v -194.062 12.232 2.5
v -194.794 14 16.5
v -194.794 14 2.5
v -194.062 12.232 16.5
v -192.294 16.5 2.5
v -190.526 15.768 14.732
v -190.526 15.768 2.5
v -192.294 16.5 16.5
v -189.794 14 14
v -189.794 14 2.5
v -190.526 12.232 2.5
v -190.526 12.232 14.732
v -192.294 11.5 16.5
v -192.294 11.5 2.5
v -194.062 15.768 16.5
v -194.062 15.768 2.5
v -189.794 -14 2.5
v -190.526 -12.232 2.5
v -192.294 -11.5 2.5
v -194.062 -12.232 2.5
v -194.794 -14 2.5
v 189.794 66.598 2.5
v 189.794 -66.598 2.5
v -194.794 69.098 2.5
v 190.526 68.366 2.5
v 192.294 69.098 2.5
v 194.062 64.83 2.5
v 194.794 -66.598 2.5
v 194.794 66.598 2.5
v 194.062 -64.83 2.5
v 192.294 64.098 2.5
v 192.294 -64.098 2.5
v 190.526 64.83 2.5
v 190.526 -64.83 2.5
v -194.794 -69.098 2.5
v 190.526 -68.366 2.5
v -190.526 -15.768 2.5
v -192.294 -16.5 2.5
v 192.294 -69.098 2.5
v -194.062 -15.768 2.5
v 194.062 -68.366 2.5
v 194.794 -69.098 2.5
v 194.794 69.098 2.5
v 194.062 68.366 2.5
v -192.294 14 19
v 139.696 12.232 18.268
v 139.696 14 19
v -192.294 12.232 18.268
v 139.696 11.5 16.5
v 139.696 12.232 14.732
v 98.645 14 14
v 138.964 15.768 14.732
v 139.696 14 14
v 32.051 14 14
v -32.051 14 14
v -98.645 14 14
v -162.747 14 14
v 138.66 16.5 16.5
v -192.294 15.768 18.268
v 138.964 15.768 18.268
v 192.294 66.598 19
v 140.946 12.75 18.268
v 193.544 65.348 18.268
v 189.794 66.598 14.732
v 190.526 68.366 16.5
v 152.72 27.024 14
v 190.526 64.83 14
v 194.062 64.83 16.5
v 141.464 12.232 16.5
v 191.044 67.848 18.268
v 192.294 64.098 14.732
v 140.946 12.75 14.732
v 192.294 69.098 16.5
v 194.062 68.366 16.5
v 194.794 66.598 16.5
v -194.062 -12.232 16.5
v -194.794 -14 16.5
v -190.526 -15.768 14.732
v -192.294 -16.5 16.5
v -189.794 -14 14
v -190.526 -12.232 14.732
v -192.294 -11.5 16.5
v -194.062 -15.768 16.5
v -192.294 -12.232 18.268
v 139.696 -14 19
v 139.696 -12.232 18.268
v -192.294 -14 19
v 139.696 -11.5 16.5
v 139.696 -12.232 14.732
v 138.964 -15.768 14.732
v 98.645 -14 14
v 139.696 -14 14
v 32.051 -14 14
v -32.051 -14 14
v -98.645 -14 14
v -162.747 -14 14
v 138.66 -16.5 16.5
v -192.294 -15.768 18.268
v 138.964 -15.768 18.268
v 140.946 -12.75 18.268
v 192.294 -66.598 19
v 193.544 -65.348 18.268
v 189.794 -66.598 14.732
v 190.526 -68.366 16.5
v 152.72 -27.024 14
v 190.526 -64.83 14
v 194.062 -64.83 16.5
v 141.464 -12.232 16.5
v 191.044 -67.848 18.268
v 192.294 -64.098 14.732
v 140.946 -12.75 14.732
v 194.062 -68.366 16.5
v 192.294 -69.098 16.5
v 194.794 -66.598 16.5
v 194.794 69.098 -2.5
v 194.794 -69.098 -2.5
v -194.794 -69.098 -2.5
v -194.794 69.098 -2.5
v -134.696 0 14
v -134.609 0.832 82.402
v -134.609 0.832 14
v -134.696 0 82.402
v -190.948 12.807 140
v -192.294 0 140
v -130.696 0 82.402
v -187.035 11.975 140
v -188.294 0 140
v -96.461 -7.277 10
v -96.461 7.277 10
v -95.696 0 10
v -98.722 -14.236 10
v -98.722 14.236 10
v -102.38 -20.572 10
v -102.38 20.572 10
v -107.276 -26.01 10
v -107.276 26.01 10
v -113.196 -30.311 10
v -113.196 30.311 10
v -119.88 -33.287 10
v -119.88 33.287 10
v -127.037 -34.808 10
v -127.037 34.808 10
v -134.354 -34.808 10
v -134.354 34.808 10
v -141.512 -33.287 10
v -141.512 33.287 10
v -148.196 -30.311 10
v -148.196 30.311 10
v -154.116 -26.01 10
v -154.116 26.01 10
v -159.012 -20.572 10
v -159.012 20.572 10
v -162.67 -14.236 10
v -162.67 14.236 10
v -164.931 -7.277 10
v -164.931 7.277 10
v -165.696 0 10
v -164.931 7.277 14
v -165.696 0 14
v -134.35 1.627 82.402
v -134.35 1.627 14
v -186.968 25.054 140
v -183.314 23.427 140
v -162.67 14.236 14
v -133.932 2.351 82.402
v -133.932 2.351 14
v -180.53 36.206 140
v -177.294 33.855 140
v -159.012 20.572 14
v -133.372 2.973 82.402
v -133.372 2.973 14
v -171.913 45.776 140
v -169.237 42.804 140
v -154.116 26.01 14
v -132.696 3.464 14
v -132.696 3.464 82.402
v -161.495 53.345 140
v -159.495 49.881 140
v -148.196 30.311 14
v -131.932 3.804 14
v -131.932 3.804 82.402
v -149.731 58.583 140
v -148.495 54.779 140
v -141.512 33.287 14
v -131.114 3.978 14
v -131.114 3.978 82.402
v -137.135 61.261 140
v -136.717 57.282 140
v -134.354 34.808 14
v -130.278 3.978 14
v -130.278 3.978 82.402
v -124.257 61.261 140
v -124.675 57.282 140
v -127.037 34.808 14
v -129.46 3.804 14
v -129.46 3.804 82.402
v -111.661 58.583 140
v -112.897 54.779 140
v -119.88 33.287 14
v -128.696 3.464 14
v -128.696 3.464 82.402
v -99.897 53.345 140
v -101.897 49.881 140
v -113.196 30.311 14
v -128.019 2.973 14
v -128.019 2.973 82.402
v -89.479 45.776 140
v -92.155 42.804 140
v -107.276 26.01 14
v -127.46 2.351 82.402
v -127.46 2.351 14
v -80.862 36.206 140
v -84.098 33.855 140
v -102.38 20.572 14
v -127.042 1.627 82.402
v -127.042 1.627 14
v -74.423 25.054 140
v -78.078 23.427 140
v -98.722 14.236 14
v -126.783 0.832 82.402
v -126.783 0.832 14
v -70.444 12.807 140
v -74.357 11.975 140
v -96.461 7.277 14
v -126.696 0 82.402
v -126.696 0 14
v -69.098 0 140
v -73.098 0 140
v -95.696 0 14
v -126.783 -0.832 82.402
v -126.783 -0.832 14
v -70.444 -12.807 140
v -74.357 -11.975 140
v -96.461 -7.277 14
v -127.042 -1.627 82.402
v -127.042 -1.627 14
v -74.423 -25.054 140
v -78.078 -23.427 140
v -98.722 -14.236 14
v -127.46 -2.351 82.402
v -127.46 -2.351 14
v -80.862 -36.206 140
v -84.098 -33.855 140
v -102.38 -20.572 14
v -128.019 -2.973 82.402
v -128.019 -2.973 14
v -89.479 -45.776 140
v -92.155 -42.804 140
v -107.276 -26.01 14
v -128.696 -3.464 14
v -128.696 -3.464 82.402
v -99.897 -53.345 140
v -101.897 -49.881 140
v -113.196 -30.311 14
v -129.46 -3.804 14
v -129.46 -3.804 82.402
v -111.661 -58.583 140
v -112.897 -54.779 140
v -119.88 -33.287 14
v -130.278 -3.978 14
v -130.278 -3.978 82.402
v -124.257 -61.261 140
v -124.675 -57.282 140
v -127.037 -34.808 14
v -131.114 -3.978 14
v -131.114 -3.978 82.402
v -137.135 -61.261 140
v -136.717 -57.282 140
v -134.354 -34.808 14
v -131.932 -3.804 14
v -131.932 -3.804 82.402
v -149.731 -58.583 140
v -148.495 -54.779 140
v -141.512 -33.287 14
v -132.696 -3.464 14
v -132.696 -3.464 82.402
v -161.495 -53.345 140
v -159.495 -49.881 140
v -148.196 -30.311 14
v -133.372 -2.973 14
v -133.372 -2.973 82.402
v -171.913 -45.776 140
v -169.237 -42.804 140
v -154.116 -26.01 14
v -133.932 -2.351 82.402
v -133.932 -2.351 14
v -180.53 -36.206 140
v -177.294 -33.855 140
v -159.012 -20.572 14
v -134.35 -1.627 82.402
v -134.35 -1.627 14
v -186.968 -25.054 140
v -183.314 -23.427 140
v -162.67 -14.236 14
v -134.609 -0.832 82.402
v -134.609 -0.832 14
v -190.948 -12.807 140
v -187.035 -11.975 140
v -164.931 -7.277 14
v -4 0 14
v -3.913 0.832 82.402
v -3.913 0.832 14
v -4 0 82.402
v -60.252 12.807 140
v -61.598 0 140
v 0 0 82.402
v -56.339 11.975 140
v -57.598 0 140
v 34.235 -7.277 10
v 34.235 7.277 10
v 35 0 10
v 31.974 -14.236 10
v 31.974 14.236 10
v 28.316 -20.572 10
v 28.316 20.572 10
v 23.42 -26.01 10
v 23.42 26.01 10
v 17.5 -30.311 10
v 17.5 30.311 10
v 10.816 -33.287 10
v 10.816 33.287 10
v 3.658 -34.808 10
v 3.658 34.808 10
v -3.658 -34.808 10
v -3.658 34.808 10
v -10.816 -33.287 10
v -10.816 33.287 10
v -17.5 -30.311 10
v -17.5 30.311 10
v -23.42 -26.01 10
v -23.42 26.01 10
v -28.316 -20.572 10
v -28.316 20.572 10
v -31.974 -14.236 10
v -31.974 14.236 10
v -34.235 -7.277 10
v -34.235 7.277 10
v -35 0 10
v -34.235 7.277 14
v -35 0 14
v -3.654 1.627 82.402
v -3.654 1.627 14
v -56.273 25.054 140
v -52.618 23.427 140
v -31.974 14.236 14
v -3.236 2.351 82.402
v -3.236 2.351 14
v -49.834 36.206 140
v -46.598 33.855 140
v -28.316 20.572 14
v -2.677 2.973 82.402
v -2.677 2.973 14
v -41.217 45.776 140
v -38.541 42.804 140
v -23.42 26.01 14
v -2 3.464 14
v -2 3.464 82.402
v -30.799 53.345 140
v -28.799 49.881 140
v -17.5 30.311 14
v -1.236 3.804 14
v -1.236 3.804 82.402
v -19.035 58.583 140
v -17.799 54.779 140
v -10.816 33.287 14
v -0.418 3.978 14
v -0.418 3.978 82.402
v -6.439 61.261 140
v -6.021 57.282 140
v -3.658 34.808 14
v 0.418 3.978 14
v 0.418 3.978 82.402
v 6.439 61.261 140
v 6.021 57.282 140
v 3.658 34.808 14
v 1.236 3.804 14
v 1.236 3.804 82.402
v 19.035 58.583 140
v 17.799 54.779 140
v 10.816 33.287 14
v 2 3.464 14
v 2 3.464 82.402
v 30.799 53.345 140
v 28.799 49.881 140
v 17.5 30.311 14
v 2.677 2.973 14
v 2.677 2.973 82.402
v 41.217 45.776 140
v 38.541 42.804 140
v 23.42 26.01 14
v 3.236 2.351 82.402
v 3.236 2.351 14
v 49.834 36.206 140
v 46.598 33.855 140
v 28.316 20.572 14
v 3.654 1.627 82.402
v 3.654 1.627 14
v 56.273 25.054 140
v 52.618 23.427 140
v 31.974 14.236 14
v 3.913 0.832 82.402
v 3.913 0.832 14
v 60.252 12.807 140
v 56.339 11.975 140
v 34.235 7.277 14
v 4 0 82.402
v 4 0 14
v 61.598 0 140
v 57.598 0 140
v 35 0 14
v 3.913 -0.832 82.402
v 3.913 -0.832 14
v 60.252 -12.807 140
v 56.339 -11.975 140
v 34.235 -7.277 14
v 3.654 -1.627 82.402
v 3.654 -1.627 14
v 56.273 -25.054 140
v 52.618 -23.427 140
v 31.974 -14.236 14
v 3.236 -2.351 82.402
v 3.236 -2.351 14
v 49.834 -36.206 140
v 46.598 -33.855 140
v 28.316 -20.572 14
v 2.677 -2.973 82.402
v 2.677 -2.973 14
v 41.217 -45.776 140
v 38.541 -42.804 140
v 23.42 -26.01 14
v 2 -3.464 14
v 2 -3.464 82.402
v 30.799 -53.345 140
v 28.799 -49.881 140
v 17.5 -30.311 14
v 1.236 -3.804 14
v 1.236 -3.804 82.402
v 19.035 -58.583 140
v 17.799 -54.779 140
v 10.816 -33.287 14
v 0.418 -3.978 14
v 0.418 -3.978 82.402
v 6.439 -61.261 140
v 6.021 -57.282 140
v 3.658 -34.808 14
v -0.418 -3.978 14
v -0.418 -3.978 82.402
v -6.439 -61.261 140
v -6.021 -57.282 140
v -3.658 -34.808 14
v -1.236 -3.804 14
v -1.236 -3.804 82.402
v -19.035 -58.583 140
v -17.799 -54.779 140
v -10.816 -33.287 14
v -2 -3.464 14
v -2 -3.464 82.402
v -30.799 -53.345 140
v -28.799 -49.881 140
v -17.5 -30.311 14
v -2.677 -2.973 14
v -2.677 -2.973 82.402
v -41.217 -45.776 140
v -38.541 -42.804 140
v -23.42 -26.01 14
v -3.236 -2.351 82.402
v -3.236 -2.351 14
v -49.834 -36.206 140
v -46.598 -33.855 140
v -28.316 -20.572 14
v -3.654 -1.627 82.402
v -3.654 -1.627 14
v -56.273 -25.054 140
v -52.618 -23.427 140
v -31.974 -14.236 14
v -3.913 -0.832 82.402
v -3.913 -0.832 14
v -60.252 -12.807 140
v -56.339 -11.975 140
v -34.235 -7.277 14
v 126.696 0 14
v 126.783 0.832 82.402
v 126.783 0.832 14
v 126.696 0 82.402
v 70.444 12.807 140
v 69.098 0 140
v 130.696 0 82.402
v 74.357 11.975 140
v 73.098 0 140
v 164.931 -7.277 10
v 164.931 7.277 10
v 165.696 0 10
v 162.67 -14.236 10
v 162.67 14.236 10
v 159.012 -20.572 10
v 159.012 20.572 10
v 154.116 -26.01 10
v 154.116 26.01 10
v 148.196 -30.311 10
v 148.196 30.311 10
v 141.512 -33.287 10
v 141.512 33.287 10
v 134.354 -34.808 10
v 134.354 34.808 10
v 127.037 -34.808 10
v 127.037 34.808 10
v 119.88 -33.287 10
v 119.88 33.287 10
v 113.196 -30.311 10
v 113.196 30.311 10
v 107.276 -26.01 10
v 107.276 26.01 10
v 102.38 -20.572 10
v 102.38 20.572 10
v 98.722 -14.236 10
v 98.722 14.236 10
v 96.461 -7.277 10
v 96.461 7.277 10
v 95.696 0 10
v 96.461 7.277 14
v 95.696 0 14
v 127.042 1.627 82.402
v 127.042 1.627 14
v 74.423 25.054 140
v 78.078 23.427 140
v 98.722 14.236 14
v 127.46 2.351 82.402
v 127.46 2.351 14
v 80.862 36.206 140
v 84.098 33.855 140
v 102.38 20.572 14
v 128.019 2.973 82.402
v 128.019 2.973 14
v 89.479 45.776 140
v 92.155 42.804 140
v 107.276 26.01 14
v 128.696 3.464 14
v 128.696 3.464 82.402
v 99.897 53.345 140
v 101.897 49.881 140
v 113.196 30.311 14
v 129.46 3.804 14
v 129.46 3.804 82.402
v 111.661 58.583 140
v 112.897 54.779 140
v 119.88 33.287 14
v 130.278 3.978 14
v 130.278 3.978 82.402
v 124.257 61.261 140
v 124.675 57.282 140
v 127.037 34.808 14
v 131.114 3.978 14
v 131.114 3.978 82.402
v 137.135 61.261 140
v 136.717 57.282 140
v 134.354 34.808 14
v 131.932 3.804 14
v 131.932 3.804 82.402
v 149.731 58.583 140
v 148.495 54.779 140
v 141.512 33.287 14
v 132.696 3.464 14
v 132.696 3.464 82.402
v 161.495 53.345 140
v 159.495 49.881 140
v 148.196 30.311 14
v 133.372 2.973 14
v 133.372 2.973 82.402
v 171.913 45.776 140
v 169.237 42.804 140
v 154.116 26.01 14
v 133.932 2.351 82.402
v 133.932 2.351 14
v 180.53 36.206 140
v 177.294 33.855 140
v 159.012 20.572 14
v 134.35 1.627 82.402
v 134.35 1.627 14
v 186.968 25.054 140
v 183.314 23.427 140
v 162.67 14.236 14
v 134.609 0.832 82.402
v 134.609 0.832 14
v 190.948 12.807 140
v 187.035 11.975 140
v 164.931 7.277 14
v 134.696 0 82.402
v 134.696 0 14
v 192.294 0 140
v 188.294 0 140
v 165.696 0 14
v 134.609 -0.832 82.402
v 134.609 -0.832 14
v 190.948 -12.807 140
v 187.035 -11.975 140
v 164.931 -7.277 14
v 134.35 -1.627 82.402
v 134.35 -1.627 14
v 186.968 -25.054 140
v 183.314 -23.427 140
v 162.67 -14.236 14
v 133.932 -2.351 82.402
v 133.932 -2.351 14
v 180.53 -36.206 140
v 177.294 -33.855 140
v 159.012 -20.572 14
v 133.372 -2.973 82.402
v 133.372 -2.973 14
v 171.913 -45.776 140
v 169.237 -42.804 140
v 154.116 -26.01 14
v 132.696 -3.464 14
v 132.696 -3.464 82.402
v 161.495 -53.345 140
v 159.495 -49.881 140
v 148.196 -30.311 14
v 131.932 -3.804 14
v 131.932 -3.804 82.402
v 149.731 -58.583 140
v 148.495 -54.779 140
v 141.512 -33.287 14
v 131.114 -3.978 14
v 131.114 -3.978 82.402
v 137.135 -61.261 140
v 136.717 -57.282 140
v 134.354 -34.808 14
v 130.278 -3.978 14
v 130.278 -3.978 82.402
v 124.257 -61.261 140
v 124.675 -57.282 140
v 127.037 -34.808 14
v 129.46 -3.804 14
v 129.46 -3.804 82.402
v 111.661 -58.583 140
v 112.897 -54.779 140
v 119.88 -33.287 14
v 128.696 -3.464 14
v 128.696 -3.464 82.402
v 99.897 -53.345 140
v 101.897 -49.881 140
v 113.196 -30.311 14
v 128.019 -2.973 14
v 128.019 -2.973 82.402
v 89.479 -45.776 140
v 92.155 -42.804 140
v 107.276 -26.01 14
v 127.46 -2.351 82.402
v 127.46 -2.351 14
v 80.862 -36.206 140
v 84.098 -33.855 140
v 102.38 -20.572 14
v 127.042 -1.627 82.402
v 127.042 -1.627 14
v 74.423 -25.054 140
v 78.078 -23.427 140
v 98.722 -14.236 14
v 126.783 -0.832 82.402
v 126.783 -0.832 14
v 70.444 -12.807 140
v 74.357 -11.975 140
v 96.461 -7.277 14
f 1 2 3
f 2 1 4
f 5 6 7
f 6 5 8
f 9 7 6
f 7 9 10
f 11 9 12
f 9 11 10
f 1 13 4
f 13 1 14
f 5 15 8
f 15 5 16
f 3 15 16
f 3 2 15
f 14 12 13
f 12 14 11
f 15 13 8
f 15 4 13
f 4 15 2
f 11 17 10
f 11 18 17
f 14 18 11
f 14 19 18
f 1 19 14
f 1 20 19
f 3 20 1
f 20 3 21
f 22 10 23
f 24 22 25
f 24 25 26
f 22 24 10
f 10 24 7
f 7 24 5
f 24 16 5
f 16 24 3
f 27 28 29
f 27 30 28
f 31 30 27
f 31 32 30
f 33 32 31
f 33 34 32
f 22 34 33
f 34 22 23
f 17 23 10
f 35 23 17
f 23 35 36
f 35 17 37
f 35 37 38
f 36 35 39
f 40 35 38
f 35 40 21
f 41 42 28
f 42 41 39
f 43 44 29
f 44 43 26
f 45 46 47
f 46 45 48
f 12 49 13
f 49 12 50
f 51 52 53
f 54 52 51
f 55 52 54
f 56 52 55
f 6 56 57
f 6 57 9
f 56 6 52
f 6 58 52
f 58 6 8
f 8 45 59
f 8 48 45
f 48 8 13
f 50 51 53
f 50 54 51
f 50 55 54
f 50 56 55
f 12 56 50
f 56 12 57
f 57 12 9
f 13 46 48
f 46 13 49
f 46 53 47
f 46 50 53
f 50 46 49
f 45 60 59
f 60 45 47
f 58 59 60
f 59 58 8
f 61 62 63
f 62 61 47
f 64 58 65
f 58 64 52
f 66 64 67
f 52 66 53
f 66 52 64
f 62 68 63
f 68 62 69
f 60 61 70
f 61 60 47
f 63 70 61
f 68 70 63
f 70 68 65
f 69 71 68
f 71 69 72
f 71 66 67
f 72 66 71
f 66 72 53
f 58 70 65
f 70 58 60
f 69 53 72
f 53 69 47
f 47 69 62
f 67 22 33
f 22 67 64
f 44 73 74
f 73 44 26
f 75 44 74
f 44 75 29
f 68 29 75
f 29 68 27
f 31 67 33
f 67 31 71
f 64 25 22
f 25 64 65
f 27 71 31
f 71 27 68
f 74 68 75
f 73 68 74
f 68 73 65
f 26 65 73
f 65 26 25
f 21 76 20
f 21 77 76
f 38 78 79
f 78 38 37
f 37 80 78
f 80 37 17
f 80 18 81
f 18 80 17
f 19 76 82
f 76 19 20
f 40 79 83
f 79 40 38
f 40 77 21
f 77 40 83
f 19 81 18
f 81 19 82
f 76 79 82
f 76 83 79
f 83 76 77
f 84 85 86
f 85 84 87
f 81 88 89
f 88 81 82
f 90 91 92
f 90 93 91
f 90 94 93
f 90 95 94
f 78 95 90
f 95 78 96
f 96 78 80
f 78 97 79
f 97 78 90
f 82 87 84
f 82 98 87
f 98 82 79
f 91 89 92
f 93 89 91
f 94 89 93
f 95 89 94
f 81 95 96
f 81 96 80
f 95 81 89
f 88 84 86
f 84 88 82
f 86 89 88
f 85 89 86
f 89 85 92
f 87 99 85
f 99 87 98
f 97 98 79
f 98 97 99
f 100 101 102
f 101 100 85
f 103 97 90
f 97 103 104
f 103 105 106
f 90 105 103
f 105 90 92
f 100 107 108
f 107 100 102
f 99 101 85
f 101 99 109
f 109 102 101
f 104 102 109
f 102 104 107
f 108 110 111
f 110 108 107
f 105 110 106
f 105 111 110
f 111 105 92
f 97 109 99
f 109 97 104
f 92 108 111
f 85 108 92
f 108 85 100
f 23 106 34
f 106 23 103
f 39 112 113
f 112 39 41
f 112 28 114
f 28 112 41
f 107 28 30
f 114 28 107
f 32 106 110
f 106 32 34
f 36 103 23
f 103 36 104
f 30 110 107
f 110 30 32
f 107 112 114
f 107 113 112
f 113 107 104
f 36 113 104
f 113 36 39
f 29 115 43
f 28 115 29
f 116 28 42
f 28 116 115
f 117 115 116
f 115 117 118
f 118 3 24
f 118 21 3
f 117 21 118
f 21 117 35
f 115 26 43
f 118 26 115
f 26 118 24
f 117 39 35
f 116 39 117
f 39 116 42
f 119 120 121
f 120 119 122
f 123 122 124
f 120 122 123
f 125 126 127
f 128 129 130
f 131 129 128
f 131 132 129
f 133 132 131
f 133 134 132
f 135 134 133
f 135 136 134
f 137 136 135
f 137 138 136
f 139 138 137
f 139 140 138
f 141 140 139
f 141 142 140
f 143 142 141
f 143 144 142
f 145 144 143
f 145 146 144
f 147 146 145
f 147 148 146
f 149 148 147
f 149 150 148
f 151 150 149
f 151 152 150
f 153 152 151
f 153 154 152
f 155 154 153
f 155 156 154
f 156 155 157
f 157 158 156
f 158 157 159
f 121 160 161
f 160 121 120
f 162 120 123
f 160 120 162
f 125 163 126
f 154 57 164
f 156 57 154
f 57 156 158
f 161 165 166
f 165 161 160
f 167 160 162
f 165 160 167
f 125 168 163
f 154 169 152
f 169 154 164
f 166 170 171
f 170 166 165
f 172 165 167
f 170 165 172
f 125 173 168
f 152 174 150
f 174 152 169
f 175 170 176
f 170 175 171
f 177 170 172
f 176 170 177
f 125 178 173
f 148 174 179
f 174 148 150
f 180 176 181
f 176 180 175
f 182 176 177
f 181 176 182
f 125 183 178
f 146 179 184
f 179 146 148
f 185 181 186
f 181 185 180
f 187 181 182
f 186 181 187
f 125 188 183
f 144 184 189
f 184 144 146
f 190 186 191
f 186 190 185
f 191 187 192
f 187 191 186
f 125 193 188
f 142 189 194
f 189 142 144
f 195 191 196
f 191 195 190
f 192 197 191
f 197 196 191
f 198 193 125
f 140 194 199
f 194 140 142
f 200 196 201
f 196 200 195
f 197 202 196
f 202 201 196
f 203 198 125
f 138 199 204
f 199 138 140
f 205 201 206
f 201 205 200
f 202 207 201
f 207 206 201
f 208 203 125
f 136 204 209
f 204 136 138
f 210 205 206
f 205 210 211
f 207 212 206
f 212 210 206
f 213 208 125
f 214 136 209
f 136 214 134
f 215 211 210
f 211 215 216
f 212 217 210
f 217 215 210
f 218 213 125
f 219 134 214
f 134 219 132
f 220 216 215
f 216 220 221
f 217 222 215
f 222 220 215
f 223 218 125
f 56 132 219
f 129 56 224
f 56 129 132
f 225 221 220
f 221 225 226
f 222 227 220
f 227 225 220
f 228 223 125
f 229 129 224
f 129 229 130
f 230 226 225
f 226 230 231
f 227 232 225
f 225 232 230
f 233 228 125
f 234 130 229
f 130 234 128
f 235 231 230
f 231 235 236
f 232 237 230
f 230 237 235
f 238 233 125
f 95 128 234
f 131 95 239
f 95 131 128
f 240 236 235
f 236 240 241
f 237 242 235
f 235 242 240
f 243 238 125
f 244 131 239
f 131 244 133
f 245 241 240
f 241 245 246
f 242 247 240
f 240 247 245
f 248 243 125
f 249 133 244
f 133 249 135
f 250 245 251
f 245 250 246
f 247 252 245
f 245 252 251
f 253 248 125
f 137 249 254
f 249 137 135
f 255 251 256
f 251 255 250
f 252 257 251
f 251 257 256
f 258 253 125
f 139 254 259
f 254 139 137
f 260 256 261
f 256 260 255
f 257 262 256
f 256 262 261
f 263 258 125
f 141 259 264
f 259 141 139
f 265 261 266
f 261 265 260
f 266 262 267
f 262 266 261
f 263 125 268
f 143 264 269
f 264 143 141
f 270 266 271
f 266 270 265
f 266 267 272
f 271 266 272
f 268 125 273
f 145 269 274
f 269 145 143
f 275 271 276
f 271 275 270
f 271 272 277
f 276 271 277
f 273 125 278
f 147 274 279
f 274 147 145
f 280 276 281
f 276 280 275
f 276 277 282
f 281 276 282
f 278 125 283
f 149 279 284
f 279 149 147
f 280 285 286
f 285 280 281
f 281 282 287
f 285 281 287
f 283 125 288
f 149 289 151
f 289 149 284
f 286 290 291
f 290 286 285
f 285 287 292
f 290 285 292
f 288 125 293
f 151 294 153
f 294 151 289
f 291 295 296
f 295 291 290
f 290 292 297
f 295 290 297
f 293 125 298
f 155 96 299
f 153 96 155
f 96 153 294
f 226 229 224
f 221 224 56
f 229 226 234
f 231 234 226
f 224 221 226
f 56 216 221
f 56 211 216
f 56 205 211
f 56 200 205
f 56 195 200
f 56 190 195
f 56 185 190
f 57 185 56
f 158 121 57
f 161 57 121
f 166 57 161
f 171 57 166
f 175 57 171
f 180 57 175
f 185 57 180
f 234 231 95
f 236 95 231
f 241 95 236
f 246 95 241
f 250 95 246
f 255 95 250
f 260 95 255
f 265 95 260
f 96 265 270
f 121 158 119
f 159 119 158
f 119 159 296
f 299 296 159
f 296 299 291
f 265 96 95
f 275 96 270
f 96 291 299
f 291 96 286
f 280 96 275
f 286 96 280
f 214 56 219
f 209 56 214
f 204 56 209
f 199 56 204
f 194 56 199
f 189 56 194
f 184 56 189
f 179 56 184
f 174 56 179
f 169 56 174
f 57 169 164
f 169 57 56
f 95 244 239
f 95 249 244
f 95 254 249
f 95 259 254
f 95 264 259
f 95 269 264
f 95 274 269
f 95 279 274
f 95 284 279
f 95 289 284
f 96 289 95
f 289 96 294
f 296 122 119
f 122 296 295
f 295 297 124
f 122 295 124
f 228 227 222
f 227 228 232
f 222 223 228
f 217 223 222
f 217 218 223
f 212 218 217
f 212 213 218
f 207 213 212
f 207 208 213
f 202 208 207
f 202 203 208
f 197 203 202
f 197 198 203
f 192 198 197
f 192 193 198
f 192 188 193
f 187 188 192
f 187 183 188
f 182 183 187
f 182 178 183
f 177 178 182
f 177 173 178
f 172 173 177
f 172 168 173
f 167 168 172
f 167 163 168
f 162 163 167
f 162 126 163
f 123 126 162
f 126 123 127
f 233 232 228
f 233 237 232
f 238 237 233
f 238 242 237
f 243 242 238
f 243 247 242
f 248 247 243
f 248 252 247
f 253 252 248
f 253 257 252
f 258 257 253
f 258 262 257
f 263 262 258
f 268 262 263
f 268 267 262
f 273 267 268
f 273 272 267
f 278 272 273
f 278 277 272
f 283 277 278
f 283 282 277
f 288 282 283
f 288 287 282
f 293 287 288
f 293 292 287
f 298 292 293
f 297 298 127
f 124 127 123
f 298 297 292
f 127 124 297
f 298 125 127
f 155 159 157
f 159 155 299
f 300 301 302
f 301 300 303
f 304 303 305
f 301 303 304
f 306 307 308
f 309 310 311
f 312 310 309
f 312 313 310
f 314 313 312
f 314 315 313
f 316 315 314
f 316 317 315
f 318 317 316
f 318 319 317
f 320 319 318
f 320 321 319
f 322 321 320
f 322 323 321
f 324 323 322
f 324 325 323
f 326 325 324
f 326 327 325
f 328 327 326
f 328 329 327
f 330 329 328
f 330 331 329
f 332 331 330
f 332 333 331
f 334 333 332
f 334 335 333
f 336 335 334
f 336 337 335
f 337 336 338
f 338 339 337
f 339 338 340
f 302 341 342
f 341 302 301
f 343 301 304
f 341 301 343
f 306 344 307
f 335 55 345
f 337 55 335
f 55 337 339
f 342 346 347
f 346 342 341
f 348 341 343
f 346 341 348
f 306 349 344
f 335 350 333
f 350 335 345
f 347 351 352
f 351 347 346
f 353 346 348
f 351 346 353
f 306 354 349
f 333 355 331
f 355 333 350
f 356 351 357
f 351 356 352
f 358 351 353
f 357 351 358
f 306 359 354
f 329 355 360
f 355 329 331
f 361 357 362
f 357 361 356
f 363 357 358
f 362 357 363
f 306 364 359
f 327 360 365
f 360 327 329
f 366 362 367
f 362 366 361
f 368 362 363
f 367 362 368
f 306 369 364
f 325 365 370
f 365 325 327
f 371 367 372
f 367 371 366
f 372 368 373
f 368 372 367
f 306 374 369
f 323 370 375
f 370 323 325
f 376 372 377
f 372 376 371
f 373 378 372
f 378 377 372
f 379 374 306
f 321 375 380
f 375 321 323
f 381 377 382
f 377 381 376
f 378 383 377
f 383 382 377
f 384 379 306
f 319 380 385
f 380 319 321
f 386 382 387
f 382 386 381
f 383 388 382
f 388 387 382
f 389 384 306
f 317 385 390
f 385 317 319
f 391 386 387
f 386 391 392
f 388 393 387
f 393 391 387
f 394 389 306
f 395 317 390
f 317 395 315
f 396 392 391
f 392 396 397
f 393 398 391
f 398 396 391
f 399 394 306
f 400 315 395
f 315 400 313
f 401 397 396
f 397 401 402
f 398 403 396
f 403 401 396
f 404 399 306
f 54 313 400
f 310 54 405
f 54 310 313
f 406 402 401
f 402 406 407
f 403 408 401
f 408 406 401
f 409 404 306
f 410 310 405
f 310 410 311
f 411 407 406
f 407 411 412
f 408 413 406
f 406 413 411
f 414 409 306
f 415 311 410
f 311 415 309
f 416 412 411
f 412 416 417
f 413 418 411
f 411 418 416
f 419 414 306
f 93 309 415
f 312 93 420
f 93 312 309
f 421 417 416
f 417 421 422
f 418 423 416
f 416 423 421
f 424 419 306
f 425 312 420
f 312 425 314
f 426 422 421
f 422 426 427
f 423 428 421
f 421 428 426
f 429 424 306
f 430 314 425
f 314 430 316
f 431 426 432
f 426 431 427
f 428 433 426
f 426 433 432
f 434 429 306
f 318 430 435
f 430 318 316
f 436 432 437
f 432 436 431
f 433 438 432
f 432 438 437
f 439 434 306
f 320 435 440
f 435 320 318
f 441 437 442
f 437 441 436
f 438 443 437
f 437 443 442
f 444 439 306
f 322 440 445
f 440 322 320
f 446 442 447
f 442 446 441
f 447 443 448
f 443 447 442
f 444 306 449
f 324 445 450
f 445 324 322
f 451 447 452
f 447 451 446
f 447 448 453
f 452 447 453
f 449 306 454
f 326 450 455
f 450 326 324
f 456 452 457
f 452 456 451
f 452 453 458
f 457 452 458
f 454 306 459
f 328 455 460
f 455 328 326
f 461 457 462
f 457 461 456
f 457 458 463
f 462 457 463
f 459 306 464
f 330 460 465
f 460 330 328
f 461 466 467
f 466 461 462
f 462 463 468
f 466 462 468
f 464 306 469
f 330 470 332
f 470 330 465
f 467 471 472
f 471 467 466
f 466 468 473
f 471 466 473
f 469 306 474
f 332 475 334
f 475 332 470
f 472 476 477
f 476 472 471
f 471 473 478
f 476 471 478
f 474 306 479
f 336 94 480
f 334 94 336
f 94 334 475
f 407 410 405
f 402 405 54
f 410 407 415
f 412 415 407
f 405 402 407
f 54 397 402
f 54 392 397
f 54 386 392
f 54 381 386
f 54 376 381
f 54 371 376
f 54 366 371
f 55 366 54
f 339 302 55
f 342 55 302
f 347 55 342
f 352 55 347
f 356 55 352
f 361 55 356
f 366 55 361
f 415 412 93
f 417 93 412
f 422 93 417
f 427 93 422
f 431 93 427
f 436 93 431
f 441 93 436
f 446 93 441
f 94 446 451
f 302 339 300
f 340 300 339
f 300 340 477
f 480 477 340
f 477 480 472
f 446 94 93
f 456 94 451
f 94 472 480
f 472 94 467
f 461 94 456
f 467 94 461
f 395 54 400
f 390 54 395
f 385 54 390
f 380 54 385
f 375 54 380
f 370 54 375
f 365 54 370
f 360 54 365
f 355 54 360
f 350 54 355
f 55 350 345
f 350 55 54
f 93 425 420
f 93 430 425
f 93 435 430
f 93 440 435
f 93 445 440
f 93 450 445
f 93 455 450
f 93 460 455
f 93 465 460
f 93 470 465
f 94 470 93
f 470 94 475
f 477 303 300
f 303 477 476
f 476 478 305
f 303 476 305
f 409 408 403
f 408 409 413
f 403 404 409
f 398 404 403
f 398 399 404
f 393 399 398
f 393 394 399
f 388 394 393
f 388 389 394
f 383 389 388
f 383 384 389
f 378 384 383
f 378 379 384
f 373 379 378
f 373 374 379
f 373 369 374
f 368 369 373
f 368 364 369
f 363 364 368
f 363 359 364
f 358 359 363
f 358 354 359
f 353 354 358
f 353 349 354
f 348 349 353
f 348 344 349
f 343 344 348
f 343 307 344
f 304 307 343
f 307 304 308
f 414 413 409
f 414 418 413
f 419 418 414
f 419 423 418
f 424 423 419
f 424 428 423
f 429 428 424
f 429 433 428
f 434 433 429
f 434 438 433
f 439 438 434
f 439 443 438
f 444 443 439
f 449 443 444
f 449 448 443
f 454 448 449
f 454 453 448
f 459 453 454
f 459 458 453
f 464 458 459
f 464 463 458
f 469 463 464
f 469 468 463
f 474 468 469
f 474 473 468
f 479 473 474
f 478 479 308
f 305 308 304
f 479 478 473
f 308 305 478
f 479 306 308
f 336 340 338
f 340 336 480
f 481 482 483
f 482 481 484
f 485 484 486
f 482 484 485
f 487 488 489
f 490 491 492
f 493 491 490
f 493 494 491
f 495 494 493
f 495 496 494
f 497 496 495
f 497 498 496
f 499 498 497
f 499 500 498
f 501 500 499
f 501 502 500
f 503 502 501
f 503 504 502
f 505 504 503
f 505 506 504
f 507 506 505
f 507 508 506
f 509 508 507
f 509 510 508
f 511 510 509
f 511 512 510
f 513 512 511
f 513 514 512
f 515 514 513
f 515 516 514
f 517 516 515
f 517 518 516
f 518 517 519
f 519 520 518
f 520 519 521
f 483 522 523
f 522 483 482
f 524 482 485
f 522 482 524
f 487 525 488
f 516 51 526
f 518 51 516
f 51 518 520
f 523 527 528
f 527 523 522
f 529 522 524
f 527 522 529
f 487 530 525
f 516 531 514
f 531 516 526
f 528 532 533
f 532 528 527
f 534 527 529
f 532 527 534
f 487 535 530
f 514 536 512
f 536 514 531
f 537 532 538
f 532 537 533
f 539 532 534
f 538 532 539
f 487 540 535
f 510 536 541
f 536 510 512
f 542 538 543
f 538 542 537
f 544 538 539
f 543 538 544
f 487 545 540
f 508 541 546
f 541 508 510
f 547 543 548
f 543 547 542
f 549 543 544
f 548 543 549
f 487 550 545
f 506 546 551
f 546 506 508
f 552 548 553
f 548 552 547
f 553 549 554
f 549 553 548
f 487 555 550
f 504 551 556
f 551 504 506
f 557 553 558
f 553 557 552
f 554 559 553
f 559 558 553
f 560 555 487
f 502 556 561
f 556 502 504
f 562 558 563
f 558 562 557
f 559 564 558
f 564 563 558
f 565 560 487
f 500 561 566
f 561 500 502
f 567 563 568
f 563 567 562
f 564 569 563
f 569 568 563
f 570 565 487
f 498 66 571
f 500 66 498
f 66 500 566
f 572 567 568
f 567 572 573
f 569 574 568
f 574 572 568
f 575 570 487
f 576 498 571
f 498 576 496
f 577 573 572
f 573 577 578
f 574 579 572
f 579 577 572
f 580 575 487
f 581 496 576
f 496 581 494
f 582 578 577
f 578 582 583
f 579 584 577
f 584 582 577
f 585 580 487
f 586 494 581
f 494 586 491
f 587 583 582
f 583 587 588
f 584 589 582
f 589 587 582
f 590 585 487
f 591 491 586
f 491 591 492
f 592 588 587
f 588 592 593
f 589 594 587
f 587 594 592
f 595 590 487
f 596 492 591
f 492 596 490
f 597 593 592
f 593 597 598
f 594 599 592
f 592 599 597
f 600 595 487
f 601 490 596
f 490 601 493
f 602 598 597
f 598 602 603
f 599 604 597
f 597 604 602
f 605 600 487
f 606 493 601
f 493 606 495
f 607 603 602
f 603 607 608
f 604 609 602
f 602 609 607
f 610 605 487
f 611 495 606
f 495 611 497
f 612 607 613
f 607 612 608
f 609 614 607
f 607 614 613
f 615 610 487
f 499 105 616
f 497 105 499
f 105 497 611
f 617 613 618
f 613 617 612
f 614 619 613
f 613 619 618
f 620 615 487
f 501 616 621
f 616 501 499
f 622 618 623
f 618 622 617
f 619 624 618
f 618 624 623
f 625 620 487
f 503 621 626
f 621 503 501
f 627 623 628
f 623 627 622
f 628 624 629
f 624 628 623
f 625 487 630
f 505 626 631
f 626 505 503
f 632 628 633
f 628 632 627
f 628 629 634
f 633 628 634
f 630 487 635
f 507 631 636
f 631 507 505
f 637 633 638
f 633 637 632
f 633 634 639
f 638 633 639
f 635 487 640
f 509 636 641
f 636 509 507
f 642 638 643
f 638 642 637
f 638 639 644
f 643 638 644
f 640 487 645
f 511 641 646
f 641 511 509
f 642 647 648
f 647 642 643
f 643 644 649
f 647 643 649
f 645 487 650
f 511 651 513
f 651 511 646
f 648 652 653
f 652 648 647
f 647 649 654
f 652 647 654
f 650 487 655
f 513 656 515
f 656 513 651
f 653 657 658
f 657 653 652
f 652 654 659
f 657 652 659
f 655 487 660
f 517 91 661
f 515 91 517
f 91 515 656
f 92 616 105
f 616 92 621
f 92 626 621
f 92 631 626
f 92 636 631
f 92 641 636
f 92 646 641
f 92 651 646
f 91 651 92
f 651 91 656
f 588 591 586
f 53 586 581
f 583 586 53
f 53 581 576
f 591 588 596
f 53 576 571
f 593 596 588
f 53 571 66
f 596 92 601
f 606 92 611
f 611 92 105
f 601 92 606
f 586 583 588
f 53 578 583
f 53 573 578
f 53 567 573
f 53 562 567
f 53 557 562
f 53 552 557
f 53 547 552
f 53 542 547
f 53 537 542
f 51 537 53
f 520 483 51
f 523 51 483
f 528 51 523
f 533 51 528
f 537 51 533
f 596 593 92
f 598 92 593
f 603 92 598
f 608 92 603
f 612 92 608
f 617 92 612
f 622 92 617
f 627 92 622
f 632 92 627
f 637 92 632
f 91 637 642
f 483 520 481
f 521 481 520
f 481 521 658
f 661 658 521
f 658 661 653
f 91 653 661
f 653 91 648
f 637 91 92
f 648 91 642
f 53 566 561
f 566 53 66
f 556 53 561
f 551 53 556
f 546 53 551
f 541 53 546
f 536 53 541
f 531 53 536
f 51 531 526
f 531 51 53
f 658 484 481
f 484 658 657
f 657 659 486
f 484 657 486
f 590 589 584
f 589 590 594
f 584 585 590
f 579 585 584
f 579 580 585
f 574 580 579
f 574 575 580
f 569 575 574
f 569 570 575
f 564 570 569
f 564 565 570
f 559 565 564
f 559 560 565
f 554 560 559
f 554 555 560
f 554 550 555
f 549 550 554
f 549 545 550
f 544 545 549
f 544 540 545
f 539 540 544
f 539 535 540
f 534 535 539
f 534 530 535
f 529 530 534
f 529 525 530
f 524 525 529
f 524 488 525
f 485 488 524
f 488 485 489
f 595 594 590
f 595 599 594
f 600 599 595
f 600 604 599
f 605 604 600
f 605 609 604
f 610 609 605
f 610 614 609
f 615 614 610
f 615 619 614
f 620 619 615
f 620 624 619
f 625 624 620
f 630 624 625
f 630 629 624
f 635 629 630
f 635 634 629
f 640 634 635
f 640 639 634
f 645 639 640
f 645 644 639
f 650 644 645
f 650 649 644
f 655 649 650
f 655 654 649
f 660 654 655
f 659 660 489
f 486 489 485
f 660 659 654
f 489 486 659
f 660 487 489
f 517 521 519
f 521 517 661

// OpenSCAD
module glassV(baseR, H, th, volume){
 innerR = ((3*volume)/3.14)^(1/3);
 stemH = H-innerR;
 glassR = innerR+th;
 rotate_extrude()
  polygon([
   [0, 0],
   [baseR, 0],
   [baseR, th],
   [th, th],
   [th, stemH],
   [glassR, H],
   [innerR, H],
   [0, stemH]]);
}

module hangerRail(L, H, offset, wireD){
 railL = L-(offset*tan(45));
 angledLineLength = sqrt((L-railL)^2 + offset^2);
 union(){
  cylinder(h=H, r=wireD/2);
  translate([0, 0, H])
   rotate([0, 90, 0])
    cylinder(h=railL, r=wireD/2);
  translate([railL, 0, H])
   rotate([0, 90, 45])
    cylinder(h=angledLineLength, r=wireD/2);
  translate([L, offset, 0])
   cylinder(h=H, r=wireD/2);
}}

module hanger(L, innerW, outerW, H, wireD){
 shelveH = 5;
 union(){
  cube([L+wireD, outerW+wireD, shelveH], center=true);
  translate([L/-2, innerW/2, shelveH/2])
   hangerRail(L=L, H=H, offset=(outerW-innerW)/2, wireD=5);
  translate([L/-2, innerW/-2, shelveH/2])
   mirror([0,1,0])
    hangerRail(L=L, H=H, offset=(outerW-innerW)/2, wireD=5);
}}

module glassRack(glassVcl, glassBaseR, glassTh, glassesN){
 glassR = ((3*(10000*glassVcl)/3.14)^(1/3))+glassTh; //Calculation retrieved from glassV shape
 L = ((glassR*2)+5)*glassesN;
 innerW = (glassTh*2)+20; //Hardcoded: no way to derive value using constraints
 outerW = (glassR*2)+10; //Hardcoded: no way to derive value using constraints
 H = glassTh+10; //Hardcoded: no way to derive value using constraints
 shelveH = 5; //Value retrieved from hanger shape
 wireD = 5;
 wireZ = shelveH/2+H+(wireD/-2); //Calculation retrieved from hanger shape
 glassZ = wireZ-glassTh;
 glassesX0 = -(L/2)+glassR;
 glassesD = ((L/2)-glassR)*2/(glassesN-1);
 union(){
  hanger(L=L, innerW=innerW, outerW=outerW, H=H, wireD=wireD);
  for (i = [0:glassesN-1]){
   glassX = glassesX0 + (i * glassesD);
   translate([glassX, 0, glassZ])
    glassV(baseR=glassBaseR, H=130, th=glassTh, volume=10000*glassVcl);
}}}

glassRack(glassVcl=20, glassBaseR=35, glassTh=4, glassesN=3);
